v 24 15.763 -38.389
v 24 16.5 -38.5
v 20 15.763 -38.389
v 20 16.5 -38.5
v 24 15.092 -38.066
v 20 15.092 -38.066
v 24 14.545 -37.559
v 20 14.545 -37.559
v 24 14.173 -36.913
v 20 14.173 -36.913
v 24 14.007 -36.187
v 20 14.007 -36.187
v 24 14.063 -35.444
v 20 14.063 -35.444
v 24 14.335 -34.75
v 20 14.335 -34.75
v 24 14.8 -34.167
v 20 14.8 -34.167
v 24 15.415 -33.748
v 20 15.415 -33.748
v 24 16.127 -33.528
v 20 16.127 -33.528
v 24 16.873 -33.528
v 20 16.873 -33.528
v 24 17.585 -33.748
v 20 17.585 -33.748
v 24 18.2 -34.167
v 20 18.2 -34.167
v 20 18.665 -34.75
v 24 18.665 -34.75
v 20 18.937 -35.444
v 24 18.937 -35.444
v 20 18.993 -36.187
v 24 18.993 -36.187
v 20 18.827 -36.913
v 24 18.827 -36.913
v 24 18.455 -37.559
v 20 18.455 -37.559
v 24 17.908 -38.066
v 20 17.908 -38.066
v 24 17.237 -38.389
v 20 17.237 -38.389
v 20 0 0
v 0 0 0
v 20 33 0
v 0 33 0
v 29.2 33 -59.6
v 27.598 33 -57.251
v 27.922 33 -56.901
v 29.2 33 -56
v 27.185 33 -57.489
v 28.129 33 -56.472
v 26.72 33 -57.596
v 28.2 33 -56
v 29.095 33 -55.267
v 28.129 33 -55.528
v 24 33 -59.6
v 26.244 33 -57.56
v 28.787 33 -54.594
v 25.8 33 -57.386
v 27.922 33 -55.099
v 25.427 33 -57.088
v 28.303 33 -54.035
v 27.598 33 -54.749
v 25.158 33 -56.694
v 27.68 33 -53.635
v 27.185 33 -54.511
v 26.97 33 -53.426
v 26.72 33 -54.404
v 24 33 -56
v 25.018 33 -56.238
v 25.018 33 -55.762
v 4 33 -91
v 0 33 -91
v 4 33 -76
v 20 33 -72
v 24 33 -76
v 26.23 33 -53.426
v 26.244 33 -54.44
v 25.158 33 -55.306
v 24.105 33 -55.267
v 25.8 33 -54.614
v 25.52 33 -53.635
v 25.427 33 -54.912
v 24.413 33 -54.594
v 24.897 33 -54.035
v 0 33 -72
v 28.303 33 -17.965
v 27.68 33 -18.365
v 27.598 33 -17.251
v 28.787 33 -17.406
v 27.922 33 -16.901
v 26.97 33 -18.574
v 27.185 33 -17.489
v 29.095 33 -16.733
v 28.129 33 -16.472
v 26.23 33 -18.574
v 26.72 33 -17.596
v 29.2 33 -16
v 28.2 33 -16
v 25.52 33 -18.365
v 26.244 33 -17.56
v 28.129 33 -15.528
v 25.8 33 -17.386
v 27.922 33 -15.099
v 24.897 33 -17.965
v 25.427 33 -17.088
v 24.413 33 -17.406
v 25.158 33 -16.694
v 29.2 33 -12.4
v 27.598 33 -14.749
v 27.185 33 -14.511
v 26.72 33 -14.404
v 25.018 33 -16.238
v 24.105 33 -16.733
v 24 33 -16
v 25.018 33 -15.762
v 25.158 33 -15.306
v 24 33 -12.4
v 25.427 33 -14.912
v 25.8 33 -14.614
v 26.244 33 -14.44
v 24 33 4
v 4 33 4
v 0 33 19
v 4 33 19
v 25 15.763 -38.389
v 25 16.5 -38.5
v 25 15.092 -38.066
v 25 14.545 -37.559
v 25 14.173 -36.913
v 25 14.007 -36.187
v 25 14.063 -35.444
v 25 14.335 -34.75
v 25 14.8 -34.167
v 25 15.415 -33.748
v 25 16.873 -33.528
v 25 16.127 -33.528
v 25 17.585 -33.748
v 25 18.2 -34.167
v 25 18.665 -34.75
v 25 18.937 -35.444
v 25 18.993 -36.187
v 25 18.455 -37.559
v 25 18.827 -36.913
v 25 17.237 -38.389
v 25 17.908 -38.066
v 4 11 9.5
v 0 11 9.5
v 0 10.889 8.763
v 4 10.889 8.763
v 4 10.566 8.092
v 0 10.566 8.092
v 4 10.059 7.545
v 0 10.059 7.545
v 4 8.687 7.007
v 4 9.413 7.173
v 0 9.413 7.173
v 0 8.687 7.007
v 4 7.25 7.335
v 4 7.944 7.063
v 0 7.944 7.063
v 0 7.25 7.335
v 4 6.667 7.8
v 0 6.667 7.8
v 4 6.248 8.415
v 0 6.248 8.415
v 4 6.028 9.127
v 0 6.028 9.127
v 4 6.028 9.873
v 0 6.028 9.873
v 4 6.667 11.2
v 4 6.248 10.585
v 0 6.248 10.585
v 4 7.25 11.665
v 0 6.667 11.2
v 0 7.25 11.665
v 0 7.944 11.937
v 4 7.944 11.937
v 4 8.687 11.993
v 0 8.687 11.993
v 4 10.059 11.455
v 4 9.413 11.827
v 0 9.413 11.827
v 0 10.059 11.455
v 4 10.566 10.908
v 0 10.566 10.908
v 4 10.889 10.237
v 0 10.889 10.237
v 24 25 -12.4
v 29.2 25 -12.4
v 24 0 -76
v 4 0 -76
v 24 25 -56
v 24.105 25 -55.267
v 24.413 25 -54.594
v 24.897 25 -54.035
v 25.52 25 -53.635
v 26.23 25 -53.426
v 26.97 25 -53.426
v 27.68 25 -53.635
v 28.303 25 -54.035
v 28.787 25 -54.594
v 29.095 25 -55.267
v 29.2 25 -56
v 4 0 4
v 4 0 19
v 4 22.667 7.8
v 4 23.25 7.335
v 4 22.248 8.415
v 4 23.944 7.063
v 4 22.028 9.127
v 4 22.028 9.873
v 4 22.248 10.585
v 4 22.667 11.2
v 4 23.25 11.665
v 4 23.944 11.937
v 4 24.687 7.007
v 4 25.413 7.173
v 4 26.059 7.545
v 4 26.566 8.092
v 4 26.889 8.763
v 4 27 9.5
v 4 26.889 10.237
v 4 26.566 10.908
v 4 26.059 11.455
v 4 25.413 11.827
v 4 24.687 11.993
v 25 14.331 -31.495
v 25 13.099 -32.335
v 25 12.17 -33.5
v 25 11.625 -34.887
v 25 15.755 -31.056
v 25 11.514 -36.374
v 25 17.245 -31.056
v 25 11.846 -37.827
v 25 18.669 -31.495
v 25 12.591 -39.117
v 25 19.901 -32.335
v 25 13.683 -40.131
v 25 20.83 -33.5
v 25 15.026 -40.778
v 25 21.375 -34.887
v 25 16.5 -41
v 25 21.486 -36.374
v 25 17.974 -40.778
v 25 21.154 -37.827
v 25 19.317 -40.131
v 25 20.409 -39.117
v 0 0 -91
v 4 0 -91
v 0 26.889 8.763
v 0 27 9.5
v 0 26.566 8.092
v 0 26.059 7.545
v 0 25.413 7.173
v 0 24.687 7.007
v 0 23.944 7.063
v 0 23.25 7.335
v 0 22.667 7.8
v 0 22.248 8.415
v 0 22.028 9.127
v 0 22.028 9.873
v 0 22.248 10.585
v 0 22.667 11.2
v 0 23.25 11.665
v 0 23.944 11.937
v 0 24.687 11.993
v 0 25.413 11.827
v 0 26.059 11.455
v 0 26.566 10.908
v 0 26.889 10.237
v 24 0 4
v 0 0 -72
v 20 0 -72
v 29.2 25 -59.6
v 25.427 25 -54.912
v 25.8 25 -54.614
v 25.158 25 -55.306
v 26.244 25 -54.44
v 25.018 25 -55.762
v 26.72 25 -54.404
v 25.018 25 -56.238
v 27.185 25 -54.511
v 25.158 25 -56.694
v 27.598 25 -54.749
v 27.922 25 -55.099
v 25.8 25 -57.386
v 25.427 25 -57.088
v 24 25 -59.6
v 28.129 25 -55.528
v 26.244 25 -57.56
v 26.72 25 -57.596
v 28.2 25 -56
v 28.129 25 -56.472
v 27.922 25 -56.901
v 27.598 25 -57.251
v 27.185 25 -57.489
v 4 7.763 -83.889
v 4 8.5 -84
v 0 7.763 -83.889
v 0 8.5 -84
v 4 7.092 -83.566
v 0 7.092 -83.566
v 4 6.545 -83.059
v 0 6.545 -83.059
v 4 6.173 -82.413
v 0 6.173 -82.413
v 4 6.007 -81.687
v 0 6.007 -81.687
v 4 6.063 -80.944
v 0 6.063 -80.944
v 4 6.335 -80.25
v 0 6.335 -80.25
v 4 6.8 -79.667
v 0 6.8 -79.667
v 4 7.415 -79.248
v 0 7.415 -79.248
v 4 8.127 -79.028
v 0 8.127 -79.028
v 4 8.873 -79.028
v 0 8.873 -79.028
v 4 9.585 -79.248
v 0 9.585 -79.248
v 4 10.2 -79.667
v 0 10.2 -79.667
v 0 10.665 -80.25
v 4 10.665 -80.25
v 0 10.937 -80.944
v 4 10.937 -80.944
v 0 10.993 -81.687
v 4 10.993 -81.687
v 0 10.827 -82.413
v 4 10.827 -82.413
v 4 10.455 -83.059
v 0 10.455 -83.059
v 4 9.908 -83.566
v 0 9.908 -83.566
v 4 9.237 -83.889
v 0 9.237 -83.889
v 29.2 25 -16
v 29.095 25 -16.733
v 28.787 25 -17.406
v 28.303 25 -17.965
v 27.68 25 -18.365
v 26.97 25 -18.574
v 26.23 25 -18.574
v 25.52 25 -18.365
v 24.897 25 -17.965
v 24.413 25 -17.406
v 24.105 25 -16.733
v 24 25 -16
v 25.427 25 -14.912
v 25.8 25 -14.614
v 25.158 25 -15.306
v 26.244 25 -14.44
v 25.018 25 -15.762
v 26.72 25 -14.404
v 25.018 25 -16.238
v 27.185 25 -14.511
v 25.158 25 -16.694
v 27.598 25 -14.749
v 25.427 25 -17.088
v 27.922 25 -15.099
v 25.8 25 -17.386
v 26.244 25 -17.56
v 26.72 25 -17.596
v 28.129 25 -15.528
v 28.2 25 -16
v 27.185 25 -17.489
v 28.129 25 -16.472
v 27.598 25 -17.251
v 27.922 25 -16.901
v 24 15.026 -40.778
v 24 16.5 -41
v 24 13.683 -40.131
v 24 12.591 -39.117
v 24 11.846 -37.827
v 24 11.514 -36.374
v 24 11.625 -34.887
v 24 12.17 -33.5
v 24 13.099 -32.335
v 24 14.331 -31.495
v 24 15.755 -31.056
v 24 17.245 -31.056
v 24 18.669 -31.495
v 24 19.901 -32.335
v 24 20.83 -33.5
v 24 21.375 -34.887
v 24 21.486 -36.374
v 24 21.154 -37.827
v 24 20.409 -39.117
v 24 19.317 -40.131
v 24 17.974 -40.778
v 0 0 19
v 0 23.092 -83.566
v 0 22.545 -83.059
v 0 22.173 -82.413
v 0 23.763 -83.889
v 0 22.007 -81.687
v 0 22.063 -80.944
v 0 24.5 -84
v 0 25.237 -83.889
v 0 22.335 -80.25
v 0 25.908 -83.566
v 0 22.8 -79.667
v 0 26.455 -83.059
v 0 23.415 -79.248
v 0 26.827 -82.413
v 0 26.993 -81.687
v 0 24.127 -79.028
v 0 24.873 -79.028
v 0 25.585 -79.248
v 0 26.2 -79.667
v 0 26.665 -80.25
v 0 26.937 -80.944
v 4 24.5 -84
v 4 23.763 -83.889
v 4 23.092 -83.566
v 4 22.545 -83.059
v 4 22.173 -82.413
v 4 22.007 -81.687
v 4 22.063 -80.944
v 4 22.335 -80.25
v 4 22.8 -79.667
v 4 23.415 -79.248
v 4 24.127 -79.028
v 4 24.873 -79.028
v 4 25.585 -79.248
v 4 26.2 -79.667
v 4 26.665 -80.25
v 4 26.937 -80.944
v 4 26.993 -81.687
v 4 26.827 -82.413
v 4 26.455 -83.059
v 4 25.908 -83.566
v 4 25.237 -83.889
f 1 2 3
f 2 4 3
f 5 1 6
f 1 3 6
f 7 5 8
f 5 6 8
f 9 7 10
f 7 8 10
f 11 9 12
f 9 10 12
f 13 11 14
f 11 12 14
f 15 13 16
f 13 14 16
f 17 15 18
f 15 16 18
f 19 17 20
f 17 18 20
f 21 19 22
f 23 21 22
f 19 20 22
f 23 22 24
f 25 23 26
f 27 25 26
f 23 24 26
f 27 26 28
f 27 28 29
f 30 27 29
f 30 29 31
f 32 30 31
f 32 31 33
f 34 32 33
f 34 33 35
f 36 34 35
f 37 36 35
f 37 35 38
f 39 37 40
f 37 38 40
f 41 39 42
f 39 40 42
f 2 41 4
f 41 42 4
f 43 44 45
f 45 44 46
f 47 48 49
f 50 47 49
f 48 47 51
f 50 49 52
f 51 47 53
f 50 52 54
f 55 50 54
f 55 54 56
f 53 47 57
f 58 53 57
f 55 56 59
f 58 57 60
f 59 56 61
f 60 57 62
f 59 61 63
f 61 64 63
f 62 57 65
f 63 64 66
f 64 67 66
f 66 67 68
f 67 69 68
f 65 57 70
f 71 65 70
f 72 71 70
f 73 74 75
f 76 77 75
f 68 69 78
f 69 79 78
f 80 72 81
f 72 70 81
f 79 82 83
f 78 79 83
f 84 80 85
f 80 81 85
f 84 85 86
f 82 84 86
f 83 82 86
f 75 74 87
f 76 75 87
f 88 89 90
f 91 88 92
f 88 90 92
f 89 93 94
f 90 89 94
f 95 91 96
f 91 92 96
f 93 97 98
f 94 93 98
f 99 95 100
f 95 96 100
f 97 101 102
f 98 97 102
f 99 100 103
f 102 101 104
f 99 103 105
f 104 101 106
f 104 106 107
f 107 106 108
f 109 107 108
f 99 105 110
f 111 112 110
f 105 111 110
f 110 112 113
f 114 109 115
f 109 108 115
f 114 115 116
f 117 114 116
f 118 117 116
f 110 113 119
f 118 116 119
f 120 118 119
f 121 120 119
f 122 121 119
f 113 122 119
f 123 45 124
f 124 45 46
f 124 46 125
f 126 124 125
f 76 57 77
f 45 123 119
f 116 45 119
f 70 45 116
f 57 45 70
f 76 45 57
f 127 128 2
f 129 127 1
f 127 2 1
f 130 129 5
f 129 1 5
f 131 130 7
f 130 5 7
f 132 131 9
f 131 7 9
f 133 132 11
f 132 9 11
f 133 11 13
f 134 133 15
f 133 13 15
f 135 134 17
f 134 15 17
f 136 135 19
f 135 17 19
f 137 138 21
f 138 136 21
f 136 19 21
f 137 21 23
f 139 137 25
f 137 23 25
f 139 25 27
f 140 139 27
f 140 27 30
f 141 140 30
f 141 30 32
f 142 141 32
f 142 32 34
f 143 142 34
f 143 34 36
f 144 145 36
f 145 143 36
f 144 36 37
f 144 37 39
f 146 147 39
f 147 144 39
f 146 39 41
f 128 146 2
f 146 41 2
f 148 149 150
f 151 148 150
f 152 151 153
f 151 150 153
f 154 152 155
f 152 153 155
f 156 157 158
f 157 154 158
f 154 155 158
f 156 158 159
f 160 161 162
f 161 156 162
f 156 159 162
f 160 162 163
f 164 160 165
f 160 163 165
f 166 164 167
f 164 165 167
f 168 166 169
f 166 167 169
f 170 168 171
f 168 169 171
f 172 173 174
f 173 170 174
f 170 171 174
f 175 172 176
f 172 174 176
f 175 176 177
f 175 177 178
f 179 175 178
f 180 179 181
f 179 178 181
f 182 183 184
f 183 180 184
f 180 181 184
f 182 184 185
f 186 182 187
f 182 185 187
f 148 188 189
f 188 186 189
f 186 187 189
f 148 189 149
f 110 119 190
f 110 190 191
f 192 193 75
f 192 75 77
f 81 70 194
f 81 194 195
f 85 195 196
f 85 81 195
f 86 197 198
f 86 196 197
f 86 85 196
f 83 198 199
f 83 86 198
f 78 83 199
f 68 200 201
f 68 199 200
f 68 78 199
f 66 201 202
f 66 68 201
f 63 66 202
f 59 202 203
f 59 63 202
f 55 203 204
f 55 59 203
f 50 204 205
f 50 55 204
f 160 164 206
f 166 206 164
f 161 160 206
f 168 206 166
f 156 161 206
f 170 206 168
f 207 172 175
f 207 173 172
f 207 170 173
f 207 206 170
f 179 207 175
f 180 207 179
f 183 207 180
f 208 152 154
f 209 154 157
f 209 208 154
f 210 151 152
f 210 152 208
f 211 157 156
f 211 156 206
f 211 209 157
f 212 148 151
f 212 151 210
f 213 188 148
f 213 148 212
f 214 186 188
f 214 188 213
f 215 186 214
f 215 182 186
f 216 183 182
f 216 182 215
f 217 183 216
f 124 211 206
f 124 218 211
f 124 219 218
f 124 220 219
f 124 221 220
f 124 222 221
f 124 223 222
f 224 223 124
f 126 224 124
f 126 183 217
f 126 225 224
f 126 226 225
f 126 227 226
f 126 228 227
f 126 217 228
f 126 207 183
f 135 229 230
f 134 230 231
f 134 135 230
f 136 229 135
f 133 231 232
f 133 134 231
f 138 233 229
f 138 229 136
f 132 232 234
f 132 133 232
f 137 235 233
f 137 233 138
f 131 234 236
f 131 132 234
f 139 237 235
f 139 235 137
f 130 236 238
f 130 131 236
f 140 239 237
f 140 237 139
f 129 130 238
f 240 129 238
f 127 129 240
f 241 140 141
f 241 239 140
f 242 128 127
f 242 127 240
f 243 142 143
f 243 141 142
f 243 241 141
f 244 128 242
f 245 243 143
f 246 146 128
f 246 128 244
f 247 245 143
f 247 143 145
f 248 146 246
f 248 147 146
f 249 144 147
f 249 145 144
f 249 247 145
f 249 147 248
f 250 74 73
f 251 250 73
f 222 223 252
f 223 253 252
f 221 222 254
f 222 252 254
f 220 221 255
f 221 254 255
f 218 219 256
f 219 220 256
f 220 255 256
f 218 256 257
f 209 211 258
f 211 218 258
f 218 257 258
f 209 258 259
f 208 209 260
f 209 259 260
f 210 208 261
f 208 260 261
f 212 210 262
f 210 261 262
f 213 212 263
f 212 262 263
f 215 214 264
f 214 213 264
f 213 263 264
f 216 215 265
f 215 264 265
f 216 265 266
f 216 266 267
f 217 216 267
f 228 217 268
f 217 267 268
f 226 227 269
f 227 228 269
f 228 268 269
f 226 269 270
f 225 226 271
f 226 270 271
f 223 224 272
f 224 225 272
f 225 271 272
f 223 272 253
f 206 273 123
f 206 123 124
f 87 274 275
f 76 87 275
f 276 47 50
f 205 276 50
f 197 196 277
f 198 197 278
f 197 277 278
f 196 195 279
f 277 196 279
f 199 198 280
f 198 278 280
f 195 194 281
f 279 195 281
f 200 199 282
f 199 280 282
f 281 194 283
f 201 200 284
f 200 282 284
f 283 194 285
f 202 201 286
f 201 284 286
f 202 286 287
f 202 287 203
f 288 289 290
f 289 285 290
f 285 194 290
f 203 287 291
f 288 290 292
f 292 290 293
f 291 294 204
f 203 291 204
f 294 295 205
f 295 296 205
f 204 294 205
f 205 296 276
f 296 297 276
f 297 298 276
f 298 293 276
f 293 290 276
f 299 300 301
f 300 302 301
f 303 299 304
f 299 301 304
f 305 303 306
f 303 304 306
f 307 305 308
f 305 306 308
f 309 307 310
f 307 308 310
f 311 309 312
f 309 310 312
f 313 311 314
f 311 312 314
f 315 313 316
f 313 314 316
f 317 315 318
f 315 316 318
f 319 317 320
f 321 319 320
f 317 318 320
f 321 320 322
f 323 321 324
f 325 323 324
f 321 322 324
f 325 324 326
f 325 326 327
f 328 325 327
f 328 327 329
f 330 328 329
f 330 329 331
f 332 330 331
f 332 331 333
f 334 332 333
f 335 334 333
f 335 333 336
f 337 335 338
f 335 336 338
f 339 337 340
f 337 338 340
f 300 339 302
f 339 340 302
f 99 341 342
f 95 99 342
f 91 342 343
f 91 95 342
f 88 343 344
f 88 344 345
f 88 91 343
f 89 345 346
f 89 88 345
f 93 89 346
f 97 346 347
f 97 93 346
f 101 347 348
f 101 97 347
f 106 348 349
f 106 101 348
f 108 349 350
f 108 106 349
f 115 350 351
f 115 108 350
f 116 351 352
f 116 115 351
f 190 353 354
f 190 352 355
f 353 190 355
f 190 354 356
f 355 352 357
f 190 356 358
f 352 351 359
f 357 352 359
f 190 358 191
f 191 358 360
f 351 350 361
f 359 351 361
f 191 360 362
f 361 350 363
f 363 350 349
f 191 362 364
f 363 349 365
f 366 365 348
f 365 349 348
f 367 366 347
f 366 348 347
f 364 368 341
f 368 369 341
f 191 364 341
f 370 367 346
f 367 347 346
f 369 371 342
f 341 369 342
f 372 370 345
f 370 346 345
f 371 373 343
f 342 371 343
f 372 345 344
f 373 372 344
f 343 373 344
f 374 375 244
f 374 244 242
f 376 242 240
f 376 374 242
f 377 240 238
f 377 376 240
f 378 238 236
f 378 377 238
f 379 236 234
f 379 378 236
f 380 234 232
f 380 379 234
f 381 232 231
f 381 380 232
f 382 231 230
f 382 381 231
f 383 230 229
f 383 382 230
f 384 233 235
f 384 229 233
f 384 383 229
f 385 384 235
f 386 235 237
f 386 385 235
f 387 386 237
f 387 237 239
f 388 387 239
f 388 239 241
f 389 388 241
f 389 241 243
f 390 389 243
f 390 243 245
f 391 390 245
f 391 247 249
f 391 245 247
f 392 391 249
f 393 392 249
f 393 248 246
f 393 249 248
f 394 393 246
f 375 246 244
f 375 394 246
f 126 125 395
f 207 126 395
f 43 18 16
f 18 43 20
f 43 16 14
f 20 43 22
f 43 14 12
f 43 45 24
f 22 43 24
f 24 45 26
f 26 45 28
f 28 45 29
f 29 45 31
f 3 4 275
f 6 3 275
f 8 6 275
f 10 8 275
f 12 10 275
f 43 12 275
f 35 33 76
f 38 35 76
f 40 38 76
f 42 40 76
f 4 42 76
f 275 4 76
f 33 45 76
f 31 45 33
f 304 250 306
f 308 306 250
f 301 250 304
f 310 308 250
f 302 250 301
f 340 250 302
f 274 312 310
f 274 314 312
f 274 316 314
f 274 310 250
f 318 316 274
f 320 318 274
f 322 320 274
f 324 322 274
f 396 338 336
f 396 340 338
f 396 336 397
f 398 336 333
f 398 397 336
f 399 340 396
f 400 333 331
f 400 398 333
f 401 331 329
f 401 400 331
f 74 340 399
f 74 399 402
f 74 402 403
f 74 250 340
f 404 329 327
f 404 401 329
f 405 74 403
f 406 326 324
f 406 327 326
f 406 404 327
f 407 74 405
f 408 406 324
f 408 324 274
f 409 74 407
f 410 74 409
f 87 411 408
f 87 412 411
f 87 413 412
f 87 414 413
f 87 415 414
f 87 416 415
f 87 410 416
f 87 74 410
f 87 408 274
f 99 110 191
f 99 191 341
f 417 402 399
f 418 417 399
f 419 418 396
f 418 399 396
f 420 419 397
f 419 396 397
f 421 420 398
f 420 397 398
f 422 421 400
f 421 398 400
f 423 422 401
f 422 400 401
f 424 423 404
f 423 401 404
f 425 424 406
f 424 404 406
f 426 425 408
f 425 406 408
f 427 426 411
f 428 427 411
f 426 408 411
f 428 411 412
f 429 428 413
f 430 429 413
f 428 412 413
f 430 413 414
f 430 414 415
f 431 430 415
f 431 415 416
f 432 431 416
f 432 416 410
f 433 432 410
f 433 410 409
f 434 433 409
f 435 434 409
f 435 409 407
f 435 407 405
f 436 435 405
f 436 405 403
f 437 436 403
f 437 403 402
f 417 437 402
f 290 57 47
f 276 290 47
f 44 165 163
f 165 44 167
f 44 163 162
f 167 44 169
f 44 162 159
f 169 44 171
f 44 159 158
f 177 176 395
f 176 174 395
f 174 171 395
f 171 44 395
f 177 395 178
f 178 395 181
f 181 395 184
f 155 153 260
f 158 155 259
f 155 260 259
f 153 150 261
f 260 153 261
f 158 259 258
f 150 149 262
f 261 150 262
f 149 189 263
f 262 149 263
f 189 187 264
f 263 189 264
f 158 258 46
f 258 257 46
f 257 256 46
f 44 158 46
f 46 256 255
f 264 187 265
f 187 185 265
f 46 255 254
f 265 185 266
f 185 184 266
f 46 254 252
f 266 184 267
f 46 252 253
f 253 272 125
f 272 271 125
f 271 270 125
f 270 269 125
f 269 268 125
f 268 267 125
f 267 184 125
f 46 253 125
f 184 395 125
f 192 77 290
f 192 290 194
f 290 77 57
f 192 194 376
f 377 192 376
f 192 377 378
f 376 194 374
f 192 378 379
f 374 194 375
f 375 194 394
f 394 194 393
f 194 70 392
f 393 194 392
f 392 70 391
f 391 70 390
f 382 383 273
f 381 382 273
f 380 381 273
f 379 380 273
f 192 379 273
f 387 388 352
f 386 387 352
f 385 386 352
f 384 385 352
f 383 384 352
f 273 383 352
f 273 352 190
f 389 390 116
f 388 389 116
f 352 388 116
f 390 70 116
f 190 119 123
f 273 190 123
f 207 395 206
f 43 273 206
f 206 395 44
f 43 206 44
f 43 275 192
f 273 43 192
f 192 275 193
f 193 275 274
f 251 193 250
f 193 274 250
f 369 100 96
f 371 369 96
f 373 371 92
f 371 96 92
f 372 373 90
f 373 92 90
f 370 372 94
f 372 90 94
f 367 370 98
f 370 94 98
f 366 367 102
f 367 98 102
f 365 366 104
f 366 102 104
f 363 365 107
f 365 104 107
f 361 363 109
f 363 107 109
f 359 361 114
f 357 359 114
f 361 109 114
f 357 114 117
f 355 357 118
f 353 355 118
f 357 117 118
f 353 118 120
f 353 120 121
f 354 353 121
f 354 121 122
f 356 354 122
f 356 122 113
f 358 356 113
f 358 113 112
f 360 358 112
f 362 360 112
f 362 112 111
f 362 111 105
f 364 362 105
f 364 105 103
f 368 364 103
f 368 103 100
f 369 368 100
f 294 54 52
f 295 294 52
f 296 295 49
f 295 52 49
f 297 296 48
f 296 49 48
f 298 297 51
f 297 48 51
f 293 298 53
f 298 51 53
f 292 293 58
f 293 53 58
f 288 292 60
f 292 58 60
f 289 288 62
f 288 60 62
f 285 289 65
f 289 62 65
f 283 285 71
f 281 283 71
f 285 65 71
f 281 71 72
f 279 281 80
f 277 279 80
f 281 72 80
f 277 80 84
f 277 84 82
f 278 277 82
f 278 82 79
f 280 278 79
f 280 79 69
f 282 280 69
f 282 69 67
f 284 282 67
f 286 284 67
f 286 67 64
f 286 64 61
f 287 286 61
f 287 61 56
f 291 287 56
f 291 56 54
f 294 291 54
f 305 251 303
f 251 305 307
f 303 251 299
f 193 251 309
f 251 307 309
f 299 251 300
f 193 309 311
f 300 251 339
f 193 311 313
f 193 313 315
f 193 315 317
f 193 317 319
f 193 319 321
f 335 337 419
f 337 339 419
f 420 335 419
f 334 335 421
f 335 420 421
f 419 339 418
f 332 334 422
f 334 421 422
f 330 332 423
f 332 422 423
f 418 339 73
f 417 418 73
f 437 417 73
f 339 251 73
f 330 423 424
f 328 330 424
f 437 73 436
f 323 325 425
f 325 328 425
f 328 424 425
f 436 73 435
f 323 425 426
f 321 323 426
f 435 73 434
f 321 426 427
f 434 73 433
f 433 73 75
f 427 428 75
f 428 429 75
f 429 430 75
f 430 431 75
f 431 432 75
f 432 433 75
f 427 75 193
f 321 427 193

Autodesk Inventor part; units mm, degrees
ref_plane "YZ Plane" through (0, 0, 0) normal (1, 0, 0) x (0, 1, 0)
ref_plane "XZ Plane" through (0, 0, 0) normal (0, 1, 0) x (-1, 0, 0)
ref_plane "XY Plane" through (0, 0, 0) normal (0, 0, 1) x (1, 0, 0)
sketch "Sketch1" plane through (0, 0, 0) normal (1, 0, 0) x (0, 1, 0)
  line L0 (0, 0) -> (33, 0)
  line L1 (33, 0) -> (33, 19)
  line L2 (33, 19) -> (0, 19)
  line L3 (0, 19) -> (0, 0)
  circle A0 centre (24.5, 9.5) radius 2.5
  circle A1 centre (8.5, 9.5) radius 2.5
  dimension "d0" = 33
  dimension "d1" = 19
  dimension "d2" = 33
  dimension "d3" = 19
  dimension "d6" = 5
  dimension "d8" = 5
extrude "Extrusion1" add sketch "Sketch1" along normal blind 4
sketch "Sketch2" plane through (0, 33, 19) normal (0, 1, 0) x (1, 0, 0)
  line L0 (0, 19) -> (4, 19) projected
  line L1 (0, 19) -> (24, 19)
  line L2 (24, 19) -> (24, 15)
  line L3 (24, 15) -> (0, 15)
  line L4 (0, 19) -> (0, 0) projected
  line L5 (0, 15) -> (0, 19)
  dimension "d11" = 24
  dimension "d12" = 4
  dimension "d13" = 24
extrude "Extrusion2" add sketch "Sketch2" against normal blind 33
sketch "Sketch3" plane through (0, 33, 19) normal (0, 1, 0) x (1, 0, 0)
  line L0 (4, 15) -> (24, 15) projected
  line L1 (24, 15) -> (24, 95)
  line L2 (24, 15) -> (20, 15)
  line L3 (20, 15) -> (20, 95)
  line L4 (20, 95) -> (24, 95)
  point P0 (0, 19)
  dimension "d16" = 80
  dimension "d17" = 4
  dimension "d18" = 80
  dimension "d19" = 4
extrude "Extrusion3" add sketch "Sketch3" against normal blind 33
sketch "Sketch4" plane through (0, 33, 19) normal (0, 1, 0) x (1, 0, 0)
  line L0 (24, 95) -> (20, 95) projected
  line L1 (24, 95) -> (0, 95)
  line L2 (0, 95) -> (0, 91)
  line L3 (0, 91) -> (24, 91)
  line L4 (24, 15) -> (24, 95) projected
  line L5 (24, 91) -> (24, 95)
  point P0 (0, 19)
  dimension "d22" = 24
  dimension "d23" = 4
  dimension "d24" = 24
  dimension "d25" = 4
extrude "Extrusion4" add sketch "Sketch4" against normal blind 33
sketch "Sketch5" plane through (0, 33, 19) normal (0, 1, 0) x (1, 0, 0)
  line L0 (0, 91) -> (0, 110)
  line L1 (0, 110) -> (4, 110)
  line L2 (4, 110) -> (4, 91)
  line L3 (20, 91) -> (0, 91) projected
  line L4 (4, 91) -> (0, 91)
  point P0 (0, 19)
  dimension "d28" = 19
  dimension "d29" = 4
  dimension "d30" = 19
  dimension "d31" = 4
extrude "Extrusion5" add sketch "Sketch5" against normal blind 33
sketch "Sketch6" plane through (4, 33, -76) normal (1, 0, 0) x (0, 0, -1)
  line L0 (15, 0) -> (-4, 0) projected
  circle A0 centre (5.5, -8.5) radius 2.5
  circle A1 centre (5.5, -24.5) radius 2.5
  point P0 (-76, -33)
  dimension "d36" = 5
  dimension "d38" = 5
hole "Hole1" at (4, 24.5, -81.5) at (4, 8.5, -81.5) direction (-1, 0, 0) diameter 5 end through all both
sketch "Sketch7" plane through (24, 0, 4) normal (1, 0, 0) x (0, 0, -1)
  line L0 (0, 33) -> (80, 33) projected
  circle A0 centre (40, 16.5) radius 5
  circle A1 centre (40, 16.5) radius 2.5
  point P0 (4, 0)
  point P1 (0, 0)
  dimension "d46" = 10
  dimension "d47" = 5
hole "Hole2" at (24, 16.5, -36) direction (-1, 0, 0) diameter 5 end through all both
extrude "Extrusion6" add sketch "Sketch7" along normal blind 1
sketch "Sketch8" plane through (0, 33, 19) normal (0, 1, 0) x (1, 0, 0)
  line L0 (24, 31.4) -> (29.2, 31.4)
  line L1 (29.2, 31.4) -> (29.2, 35)
  line L2 (26.6, 37.6) -> (26.6, 37.6)
  line L3 (24, 35) -> (24, 31.4)
  arc A0 (26.6, 37.6) -> (24, 35) centre (26.6, 35) ccw
  arc A1 (29.2, 35) -> (26.6, 37.6) centre (26.6, 35) ccw
  circle A2 centre (26.6, 35) radius 1.6
  point P0 (0, 19)
  point P1 (24, 15)
  point P2 (29.2, 37.6)
  point P3 (24, 37.6)
  dimension "d58" = 5.2
  dimension "d59" = 6.2
  dimension "d60" = 5.2
  dimension "d61" = 6.2
  dimension "d62" = 2.6
  dimension "d63" = 3.2
extrude "Extrusion7" add sketch "Sketch8" against normal blind 8
sketch "Sketch9" plane through (0, 33, 19) normal (0, 1, 0) x (1, 0, 0)
  line L0 (24, 95) -> (4, 95) projected
  line L1 (24, 95) -> (24, 15) projected
  line L2 (24, 78.6) -> (29.2, 78.6)
  line L3 (29.2, 78.6) -> (29.2, 75)
  line L4 (26.6, 72.4) -> (26.6, 72.4)
  line L5 (24, 75) -> (24, 78.6)
  arc A0 (26.6, 72.4) -> (29.2, 75) centre (26.6, 75) ccw
  arc A1 (24, 75) -> (26.6, 72.4) centre (26.6, 75) ccw
  circle A2 centre (26.6, 75) radius 1.6
  point P0 (0, 19)
  point P1 (29.2, 72.4)
  point P2 (24, 72.4)
  dimension "d67" = 5.2
  dimension "d68" = 6.2
  dimension "d69" = 5.2
  dimension "d70" = 6.2
  dimension "d71" = 2.6
  dimension "d72" = 3.2
extrude "Extrusion8" add sketch "Sketch9" against normal blind 8
